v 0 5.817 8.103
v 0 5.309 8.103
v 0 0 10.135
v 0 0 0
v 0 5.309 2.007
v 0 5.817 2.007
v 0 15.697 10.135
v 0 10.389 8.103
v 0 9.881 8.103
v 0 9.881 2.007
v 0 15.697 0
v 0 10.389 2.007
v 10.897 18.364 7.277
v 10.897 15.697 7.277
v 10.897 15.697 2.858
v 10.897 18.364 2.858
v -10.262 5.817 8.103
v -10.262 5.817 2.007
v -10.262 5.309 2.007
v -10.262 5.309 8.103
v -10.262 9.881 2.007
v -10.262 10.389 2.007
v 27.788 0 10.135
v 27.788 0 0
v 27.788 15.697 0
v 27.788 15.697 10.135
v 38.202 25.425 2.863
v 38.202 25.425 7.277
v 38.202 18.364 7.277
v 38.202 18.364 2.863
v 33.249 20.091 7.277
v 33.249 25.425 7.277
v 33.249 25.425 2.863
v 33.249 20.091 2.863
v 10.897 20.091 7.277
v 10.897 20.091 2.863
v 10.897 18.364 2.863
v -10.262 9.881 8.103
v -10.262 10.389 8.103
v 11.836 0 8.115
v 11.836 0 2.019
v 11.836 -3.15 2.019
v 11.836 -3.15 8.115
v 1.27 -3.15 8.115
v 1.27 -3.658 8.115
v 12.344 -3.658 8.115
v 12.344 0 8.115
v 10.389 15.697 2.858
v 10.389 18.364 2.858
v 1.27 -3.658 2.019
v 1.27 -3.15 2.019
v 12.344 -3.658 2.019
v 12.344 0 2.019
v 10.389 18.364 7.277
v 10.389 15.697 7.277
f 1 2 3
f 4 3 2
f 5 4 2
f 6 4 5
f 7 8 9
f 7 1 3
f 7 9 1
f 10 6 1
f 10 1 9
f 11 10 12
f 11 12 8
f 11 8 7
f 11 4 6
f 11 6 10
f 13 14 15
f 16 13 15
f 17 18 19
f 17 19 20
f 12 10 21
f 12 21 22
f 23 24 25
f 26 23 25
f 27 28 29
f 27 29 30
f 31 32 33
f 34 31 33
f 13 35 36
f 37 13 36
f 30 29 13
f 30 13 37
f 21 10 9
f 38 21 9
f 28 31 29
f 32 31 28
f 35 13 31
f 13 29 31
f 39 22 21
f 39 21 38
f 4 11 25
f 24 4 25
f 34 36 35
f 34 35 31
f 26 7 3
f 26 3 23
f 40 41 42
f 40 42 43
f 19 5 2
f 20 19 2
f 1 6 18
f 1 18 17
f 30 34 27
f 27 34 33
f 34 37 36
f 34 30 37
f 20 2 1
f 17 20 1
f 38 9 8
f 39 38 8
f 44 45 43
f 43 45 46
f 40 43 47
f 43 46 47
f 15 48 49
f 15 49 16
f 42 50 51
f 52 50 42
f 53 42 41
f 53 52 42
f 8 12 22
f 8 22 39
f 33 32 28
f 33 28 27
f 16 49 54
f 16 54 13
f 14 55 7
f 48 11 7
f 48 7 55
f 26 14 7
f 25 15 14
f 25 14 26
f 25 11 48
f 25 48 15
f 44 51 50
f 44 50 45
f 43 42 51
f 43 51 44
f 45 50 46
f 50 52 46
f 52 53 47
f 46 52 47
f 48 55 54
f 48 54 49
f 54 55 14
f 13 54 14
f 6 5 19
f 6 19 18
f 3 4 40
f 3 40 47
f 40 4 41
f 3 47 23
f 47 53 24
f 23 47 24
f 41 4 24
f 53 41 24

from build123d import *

# Parameters (mm, degrees)
SKETCH1_W           = 27.7876
SKETCH1_H           = 15.6972
BOSS_EXTRUDE1_DEPTH = 10.1346
SKETCH2_W           = 6.096
SKETCH2_H           = 0.508
BOSS_EXTRUDE2_DEPTH = 10.2616
SKETCH4_W           = 0.508
SKETCH4_H           = 4.4196
BOSS_EXTRUDE3_DEPTH = 2.667
SKETCH5_W           = 4.414586419
SKETCH5_H           = 7.0612
BOSS_EXTRUDE4_DEPTH = 27.305
SKETCH6_W           = 22.352
SKETCH6_H           = 4.414586419
CUT_EXTRUDE1_DEPTH  = 5.334
SKETCH7_W           = 0.508
SKETCH7_H           = 6.096
BOSS_EXTRUDE5_DEPTH = 3.6576
SKETCH8_W           = 6.096
SKETCH8_H           = 0.508
BOSS_EXTRUDE6_DEPTH = 10.5664


with BuildPart() as part:
    # Sketch1 → Boss-Extrude1 (new body)
    with BuildSketch(Plane.XY):
        with Locations((13.8938, 7.8486)):
            Rectangle(SKETCH1_W, SKETCH1_H)
    extrude(amount=BOSS_EXTRUDE1_DEPTH)

    # Sketch2 → Boss-Extrude2 (add)
    with BuildSketch(Plane.ZY):
        with Locations((5.0546, 10.1346)):
            Rectangle(SKETCH2_W, SKETCH2_H)
        with Locations((5.0546, 5.5626)):
            Rectangle(SKETCH2_W, SKETCH2_H)
    extrude(amount=BOSS_EXTRUDE2_DEPTH)

    # Sketch4 → Boss-Extrude3 (add)
    with BuildSketch(Plane(origin=(0, 15.6972, 0), x_dir=(1, 0, 0), z_dir=(0, 1, 0))):
        with Locations((10.6426, -5.0673)):
            Rectangle(SKETCH4_W, SKETCH4_H)
    extrude(amount=BOSS_EXTRUDE3_DEPTH)

    # Sketch7 → Boss-Extrude5 (add)
    with BuildSketch(Plane.XZ):
        with Locations((12.0904, 5.0673)):
            Rectangle(SKETCH7_W, SKETCH7_H)
    extrude(amount=BOSS_EXTRUDE5_DEPTH)

    # Sketch8 → Boss-Extrude6 (add)
    with BuildSketch(Plane.ZY.offset(-11.8364)):
        with Locations((5.0673, -3.4036)):
            Rectangle(SKETCH8_W, SKETCH8_H)
    extrude(amount=BOSS_EXTRUDE6_DEPTH)


with BuildPart() as body_2:
    # Sketch5 → Boss-Extrude4 (new body)
    with BuildSketch(Plane(origin=(10.8966, 0, 0), x_dir=(0, 0, -1), z_dir=(1, 0, 0))):
        with Locations((-5.069806791, 21.8948)):
            Rectangle(SKETCH5_W, SKETCH5_H)
    extrude(amount=BOSS_EXTRUDE4_DEPTH)

    # Sketch6 → Cut-Extrude1 (cut)
    with BuildSketch(Plane(origin=(0, 25.4254, 0), x_dir=(1, 0, 0), z_dir=(0, 1, 0))):
        with Locations((22.0726, -5.069806791)):
            Rectangle(SKETCH6_W, SKETCH6_H)
    extrude(amount=-CUT_EXTRUDE1_DEPTH, mode=Mode.SUBTRACT)


solid = Compound([part.part, body_2.part])
